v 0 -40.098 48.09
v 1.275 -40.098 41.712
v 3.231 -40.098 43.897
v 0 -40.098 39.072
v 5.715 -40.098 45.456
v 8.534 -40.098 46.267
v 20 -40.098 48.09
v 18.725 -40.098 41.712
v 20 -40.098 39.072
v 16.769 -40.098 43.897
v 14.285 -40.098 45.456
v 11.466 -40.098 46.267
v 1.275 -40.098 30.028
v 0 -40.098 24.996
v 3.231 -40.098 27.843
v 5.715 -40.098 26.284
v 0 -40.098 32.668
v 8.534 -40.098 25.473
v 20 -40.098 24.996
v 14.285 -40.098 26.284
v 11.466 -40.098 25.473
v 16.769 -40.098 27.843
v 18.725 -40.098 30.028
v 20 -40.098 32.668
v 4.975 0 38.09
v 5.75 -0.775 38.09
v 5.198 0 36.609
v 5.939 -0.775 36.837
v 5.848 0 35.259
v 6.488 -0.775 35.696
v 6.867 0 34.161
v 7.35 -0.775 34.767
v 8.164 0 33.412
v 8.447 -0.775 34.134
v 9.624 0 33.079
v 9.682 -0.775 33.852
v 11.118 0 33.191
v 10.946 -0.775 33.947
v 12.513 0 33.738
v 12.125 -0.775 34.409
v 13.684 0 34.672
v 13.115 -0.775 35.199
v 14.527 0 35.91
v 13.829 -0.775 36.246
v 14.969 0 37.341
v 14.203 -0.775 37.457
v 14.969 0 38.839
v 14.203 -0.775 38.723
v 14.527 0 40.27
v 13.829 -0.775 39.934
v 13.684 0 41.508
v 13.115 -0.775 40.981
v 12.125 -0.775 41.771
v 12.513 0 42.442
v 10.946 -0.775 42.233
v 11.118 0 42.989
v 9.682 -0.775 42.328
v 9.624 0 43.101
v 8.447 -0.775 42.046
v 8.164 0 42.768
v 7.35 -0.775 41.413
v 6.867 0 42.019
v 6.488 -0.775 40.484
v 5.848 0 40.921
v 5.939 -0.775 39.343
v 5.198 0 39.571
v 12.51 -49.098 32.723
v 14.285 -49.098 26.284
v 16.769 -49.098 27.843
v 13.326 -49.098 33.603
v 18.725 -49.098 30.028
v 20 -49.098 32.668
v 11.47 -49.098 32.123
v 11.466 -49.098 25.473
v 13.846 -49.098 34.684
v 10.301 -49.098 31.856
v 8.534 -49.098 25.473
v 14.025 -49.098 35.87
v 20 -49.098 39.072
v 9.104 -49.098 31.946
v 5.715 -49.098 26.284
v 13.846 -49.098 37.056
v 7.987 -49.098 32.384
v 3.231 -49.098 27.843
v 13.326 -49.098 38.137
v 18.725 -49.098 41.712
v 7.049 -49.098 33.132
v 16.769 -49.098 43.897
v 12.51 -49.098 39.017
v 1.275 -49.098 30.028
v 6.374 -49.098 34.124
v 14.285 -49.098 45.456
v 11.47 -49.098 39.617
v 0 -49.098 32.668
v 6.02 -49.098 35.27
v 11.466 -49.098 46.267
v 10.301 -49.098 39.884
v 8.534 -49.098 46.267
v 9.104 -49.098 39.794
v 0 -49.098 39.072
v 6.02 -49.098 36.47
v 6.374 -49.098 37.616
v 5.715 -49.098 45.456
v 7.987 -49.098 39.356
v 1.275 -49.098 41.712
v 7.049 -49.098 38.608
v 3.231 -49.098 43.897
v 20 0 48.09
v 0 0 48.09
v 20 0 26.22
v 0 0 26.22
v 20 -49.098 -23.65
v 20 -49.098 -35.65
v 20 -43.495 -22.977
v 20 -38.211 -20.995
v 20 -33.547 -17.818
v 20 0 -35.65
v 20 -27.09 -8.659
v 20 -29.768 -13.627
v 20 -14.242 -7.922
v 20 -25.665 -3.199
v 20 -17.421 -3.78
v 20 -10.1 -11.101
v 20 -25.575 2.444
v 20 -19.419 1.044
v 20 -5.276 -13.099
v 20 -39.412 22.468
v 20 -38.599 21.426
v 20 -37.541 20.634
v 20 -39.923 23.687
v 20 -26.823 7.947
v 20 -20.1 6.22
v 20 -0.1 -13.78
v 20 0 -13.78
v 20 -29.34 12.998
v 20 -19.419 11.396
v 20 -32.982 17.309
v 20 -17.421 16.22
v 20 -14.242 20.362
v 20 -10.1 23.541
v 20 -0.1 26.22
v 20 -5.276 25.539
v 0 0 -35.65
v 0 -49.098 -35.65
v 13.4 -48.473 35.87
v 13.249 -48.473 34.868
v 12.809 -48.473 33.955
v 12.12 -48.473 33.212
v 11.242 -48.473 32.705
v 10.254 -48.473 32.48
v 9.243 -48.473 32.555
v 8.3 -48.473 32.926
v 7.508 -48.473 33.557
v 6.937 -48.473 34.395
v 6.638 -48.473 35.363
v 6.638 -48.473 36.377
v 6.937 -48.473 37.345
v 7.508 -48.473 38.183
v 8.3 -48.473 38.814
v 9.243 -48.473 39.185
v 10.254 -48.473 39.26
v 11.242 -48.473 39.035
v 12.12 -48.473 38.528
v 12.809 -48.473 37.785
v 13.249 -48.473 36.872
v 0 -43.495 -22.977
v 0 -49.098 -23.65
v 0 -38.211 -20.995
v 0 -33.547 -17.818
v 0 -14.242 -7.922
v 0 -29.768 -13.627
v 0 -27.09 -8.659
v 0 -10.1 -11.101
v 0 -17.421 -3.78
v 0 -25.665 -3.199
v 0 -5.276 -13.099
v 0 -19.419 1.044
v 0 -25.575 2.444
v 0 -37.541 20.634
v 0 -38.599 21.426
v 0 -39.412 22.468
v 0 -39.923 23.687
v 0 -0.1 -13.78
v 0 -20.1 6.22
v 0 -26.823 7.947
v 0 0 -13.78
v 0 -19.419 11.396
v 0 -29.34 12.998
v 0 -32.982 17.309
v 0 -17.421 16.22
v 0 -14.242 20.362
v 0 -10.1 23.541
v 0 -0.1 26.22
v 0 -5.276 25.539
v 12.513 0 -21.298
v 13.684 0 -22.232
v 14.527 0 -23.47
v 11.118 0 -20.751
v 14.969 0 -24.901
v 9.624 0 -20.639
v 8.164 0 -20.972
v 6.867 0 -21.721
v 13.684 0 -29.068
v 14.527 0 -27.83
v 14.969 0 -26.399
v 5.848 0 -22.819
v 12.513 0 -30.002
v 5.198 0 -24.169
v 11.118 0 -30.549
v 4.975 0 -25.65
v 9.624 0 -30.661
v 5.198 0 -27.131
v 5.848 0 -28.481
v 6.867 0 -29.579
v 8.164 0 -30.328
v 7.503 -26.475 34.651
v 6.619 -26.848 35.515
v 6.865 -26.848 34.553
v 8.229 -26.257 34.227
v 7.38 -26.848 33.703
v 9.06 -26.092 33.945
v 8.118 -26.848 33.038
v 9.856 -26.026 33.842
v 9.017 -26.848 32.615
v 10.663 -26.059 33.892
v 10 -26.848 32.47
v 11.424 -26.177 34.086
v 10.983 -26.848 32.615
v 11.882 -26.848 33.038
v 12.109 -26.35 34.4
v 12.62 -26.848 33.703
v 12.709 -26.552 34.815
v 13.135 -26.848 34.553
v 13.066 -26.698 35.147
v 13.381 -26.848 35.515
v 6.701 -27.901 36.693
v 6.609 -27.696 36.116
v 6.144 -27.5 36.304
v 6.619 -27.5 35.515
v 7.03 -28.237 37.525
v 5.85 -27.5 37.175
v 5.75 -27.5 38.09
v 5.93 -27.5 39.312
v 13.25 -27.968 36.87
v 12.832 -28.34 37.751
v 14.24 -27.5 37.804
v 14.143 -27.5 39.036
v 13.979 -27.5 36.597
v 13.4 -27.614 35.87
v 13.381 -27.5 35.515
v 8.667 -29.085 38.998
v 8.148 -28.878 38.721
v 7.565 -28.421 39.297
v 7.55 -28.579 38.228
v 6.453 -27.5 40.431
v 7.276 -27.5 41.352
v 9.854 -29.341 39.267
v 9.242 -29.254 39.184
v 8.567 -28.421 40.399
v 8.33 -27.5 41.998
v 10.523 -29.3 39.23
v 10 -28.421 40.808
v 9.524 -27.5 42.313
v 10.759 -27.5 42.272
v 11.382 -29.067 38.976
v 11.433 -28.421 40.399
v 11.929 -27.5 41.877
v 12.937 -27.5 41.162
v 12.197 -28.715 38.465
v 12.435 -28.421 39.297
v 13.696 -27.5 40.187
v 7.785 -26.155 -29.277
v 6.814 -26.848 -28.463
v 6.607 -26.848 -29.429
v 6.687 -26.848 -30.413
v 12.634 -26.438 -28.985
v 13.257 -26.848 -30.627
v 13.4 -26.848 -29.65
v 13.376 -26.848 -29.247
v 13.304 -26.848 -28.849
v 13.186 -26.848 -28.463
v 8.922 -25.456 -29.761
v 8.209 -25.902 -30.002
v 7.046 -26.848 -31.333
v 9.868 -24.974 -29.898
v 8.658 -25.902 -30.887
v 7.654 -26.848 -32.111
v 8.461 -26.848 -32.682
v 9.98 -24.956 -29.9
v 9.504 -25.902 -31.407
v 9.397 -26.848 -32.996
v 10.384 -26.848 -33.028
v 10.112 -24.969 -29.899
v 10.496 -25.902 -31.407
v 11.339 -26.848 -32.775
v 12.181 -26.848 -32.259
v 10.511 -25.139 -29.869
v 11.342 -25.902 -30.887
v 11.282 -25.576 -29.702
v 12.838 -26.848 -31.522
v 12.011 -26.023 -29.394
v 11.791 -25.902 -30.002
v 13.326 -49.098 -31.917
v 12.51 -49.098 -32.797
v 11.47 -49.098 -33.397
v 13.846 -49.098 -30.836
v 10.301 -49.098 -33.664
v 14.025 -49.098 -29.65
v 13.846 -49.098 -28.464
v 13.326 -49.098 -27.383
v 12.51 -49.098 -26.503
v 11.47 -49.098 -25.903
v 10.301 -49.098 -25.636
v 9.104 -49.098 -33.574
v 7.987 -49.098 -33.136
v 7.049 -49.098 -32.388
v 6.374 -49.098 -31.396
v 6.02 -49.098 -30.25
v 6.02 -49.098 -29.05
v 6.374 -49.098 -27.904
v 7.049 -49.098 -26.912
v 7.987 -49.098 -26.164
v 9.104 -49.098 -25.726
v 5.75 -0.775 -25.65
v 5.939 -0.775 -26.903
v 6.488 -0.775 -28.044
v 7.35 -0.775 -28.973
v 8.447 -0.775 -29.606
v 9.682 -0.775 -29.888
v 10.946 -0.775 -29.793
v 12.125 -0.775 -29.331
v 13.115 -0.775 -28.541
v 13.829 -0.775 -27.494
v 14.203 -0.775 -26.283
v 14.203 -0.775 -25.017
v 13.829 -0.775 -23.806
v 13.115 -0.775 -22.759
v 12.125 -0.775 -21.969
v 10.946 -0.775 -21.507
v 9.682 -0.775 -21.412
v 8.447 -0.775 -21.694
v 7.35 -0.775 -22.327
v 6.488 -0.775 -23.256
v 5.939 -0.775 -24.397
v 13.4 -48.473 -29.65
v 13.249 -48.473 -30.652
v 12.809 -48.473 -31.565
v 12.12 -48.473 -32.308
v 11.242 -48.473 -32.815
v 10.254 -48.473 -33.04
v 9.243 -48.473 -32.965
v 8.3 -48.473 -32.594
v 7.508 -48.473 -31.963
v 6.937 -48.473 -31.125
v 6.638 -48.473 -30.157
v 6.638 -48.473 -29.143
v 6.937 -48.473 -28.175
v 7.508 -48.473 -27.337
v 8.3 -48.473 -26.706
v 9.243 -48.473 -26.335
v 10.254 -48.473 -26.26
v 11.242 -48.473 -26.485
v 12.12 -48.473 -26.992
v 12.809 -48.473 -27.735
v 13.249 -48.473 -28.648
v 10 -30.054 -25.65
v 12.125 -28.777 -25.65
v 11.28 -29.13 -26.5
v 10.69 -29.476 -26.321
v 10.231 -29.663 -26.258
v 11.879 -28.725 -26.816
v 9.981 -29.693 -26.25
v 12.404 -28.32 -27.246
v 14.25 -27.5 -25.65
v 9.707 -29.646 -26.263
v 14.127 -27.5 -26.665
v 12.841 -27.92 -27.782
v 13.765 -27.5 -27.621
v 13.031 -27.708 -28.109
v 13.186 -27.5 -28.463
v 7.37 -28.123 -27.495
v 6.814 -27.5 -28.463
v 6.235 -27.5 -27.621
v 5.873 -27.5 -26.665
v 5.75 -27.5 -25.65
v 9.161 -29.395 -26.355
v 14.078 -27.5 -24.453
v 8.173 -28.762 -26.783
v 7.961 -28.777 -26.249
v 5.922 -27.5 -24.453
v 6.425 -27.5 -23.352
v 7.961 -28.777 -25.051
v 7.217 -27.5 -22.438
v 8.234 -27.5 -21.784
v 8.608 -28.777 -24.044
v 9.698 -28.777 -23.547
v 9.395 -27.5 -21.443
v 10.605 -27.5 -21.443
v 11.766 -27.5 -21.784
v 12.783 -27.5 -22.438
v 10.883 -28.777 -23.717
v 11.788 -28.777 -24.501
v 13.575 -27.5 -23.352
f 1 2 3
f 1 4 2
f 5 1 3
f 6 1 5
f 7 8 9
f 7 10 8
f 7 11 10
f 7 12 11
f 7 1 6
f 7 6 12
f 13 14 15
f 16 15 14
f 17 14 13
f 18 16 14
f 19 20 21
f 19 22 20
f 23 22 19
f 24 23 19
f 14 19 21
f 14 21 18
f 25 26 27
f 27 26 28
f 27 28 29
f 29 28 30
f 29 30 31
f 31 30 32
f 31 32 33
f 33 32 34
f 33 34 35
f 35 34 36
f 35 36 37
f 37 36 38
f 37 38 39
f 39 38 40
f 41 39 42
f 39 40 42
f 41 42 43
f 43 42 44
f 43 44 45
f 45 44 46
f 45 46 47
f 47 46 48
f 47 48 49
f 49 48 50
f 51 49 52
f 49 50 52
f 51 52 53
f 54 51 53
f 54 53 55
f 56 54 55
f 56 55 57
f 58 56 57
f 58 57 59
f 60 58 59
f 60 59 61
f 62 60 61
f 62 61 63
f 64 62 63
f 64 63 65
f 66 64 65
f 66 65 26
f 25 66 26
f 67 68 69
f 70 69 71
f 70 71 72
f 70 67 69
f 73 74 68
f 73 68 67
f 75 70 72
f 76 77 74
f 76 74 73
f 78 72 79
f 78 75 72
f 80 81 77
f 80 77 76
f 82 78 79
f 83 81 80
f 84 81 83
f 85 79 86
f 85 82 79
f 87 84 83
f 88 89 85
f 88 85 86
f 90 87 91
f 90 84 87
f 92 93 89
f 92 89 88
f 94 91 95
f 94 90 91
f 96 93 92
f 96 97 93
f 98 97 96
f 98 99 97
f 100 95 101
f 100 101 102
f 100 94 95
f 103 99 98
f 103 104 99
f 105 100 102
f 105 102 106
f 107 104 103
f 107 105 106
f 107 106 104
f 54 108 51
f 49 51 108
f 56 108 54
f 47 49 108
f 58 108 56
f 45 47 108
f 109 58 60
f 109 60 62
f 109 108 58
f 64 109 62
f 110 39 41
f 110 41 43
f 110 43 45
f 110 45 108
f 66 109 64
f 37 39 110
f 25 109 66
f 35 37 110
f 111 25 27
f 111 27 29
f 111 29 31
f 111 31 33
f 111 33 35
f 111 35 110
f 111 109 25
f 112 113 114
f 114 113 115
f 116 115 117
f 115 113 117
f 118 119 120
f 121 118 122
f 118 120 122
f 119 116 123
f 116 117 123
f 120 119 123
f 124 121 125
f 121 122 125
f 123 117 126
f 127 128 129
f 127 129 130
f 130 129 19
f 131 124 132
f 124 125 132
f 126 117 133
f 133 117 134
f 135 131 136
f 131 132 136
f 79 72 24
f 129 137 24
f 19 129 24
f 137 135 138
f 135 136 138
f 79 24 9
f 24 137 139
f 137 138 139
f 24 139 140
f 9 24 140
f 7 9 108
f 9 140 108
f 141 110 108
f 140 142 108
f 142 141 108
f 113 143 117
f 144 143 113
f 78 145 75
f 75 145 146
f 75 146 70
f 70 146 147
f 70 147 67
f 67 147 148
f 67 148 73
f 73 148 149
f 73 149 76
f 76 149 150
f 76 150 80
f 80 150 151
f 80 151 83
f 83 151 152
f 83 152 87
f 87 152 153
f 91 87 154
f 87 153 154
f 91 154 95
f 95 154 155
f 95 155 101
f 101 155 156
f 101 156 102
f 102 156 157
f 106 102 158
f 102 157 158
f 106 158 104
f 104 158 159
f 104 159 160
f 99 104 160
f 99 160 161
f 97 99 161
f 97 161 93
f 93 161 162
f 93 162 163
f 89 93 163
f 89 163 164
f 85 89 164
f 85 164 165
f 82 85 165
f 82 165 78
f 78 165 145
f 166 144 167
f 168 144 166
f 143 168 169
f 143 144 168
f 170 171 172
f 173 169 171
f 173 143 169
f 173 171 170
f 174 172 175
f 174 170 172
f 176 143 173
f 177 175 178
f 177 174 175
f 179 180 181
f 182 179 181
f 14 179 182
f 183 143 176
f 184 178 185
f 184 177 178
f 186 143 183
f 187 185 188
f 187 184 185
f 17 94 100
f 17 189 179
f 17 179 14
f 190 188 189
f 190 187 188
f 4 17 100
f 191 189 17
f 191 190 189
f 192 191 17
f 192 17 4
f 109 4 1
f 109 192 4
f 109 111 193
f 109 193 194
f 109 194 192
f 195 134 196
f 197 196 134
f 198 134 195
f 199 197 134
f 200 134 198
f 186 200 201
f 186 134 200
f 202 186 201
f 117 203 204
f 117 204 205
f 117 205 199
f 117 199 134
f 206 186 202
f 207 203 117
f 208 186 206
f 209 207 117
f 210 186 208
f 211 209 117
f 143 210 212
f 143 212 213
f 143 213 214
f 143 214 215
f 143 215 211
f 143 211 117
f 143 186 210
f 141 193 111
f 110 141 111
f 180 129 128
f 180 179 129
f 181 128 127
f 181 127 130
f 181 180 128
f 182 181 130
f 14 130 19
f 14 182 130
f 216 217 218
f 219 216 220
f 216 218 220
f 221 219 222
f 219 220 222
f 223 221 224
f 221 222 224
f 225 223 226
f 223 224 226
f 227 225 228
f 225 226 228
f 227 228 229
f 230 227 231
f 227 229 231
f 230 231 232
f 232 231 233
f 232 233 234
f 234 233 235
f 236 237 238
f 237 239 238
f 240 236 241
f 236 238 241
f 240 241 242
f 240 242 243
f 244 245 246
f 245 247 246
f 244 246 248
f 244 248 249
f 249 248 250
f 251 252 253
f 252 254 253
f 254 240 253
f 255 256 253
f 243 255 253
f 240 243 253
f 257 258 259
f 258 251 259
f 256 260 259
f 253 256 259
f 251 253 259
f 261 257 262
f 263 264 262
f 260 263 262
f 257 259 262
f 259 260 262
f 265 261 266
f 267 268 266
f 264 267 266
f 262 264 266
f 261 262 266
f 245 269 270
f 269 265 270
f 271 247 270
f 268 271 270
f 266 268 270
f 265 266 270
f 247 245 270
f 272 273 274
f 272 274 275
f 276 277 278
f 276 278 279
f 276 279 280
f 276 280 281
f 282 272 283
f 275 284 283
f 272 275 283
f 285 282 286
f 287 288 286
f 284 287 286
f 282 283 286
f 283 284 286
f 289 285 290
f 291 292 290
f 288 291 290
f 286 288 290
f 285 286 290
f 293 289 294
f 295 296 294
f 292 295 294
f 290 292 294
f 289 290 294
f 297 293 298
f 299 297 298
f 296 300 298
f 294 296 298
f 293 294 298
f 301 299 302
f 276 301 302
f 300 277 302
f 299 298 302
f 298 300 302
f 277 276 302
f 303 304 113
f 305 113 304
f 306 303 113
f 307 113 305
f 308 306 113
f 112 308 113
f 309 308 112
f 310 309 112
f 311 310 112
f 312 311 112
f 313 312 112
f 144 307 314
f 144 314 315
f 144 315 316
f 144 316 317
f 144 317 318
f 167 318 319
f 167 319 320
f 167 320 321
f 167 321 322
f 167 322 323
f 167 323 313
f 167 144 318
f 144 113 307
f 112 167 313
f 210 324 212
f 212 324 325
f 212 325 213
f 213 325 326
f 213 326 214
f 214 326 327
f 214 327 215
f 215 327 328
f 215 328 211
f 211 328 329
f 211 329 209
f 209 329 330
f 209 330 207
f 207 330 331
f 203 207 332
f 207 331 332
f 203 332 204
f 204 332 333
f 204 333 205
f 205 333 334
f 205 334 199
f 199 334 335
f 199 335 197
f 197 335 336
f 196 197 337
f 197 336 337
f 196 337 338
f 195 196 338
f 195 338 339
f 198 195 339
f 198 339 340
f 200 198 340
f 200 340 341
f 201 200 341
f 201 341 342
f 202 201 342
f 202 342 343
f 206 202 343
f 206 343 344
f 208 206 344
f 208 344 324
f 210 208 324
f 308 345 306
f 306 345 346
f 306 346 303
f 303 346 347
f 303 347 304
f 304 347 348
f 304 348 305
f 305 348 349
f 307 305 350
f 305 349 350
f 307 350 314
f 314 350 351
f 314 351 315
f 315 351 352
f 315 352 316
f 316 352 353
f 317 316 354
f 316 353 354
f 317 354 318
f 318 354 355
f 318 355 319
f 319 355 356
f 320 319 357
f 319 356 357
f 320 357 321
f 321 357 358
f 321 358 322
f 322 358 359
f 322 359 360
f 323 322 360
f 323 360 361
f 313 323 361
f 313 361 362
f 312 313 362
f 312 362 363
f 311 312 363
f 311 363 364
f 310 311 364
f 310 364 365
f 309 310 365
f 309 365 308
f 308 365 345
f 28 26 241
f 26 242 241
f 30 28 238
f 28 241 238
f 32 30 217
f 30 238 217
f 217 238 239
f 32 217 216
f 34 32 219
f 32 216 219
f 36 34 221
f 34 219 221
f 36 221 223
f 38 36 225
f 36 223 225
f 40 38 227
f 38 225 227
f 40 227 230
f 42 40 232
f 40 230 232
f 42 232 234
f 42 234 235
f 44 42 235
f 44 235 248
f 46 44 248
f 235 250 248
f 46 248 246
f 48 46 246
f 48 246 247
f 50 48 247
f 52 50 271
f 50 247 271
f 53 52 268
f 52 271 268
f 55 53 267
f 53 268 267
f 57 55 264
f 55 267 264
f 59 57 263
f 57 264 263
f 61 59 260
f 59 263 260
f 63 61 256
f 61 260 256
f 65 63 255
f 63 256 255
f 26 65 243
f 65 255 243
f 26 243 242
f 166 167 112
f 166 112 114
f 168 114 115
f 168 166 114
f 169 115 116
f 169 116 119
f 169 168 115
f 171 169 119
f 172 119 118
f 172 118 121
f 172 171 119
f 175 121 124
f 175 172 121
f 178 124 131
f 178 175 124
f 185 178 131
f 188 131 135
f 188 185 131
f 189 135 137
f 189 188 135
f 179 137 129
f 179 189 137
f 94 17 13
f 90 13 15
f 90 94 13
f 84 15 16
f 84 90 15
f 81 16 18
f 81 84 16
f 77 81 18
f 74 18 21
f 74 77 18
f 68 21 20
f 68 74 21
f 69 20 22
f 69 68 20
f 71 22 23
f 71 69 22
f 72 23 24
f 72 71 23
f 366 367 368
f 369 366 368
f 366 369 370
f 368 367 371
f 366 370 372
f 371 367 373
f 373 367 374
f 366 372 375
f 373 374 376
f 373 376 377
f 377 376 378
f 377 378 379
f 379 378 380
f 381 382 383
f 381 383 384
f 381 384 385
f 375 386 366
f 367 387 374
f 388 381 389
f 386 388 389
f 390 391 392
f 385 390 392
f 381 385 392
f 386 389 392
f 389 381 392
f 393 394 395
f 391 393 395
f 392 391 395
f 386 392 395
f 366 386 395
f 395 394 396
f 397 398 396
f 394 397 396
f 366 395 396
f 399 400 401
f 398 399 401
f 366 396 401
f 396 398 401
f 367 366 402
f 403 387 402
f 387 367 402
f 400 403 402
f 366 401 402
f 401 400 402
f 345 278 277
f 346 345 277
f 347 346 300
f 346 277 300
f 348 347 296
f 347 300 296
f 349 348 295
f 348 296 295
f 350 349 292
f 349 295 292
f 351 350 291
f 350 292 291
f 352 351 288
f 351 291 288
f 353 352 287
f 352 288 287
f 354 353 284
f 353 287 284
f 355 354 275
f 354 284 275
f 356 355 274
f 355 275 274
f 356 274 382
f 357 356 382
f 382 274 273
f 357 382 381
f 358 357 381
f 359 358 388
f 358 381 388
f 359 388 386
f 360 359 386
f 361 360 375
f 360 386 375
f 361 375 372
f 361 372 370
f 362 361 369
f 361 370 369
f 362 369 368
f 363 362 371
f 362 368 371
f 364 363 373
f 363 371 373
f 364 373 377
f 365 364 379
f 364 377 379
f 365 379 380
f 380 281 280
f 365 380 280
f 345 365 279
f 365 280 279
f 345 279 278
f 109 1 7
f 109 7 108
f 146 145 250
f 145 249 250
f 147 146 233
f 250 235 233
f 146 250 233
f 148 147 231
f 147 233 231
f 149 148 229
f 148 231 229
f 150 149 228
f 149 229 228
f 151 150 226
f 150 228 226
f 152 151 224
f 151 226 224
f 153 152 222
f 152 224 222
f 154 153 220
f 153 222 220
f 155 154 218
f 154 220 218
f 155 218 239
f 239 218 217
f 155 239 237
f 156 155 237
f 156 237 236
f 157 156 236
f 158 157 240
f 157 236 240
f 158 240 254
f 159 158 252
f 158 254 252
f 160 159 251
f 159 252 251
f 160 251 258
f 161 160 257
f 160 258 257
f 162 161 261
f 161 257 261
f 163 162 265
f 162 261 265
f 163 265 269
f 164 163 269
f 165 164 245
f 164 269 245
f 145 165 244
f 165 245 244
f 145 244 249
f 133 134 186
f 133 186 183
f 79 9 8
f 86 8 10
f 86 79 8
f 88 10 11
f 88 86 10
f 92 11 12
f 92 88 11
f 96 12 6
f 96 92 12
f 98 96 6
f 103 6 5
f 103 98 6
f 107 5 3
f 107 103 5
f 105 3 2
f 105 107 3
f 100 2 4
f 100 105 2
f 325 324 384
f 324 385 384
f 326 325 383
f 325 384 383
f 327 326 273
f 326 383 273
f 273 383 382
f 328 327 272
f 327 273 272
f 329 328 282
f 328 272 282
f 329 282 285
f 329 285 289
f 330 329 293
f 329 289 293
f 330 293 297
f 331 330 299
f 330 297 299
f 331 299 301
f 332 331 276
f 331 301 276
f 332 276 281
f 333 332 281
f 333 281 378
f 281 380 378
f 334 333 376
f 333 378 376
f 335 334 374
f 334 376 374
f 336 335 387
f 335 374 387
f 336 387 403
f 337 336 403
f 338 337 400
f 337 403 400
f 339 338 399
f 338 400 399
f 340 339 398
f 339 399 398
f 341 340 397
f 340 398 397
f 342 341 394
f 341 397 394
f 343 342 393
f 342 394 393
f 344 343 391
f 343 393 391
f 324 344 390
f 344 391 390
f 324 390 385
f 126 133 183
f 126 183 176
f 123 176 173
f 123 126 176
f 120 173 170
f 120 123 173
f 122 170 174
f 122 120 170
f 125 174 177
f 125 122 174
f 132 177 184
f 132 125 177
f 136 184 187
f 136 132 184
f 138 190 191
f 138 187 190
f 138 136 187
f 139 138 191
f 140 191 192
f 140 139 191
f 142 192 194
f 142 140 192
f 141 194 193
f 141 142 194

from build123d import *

# Parameters (mm, degrees)
BOSS_EXTRUDE1_DEPTH          = 20
M10_TAPPED_HOLE1_D           = 8.5
M10_TAPPED_HOLE1_DEPTH       = 27.5
M10_TAPPED_HOLE1_CSINK_D     = 10.05
M10_TAPPED_HOLE1_CSINK_ANGLE = 90
M10_TAPPED_HOLE1_TIP         = 2.553657631
M8_TAPPED_HOLE1_D            = 6.8
M8_TAPPED_HOLE1_DEPTH        = 22.25
M8_TAPPED_HOLE1_CSINK_D      = 8.05
M8_TAPPED_HOLE1_CSINK_ANGLE  = 90
M8_TAPPED_HOLE1_TIP          = 2.042926105
CUT_EXTRUDE1_DEPTH           = 72.576963501
SKETCH7_R                    = 21.448918638
SKETCH7_R_2                  = 10.5
CUT_EXTRUDE2_DEPTH           = 9
FILLET1_R                    = 5


with BuildPart() as part:
    # Sketch1 → Boss-Extrude1 (new body)
    with BuildSketch(Plane(origin=(0, 0, 0), x_dir=(0, 0, -1), z_dir=(1, 0, 0))):
        with BuildLine():
            Line((-35.65, 0), (35.65, 0))
            Line((35.65, 0), (35.65, -49.098))
            Line((35.65, -49.098), (23.65, -49.098))
            ThreePointArc((23.65, -49.098), (0, -25.448), (-23.65, -49.098))
            Line((-23.65, -49.098), (-35.65, -49.098))
            Line((-35.65, -49.098), (-48.09, -49.098))
            Line((-48.09, -49.098), (-48.09, 0))
            Line((-48.09, 0), (-35.65, 0))
        make_face()
    extrude(amount=BOSS_EXTRUDE1_DEPTH)

    # M10 Tapped Hole1
    with Locations(Plane(origin=(0, 0, 0), x_dir=(1, 0, 0), z_dir=(0, 1, 0))):
        with Locations((10, -38.09), (10, 25.65)):
            CounterSinkHole(M10_TAPPED_HOLE1_D / 2, M10_TAPPED_HOLE1_CSINK_D / 2, depth=M10_TAPPED_HOLE1_DEPTH, counter_sink_angle=M10_TAPPED_HOLE1_CSINK_ANGLE)
            with Locations((0, 0, -(M10_TAPPED_HOLE1_DEPTH + M10_TAPPED_HOLE1_TIP / 2))):  # 118° drill point
                Cone(0, M10_TAPPED_HOLE1_D / 2, M10_TAPPED_HOLE1_TIP, mode=Mode.SUBTRACT)

    # M8 Tapped Hole1
    with Locations(Plane(origin=(0, -49.098, 0), x_dir=(-1, 0, 0), z_dir=(0, -1, 0))):
        with Locations((-10, -35.87), (-10, 29.65)):
            CounterSinkHole(M8_TAPPED_HOLE1_D / 2, M8_TAPPED_HOLE1_CSINK_D / 2, depth=M8_TAPPED_HOLE1_DEPTH, counter_sink_angle=M8_TAPPED_HOLE1_CSINK_ANGLE)
            with Locations((0, 0, -(M8_TAPPED_HOLE1_DEPTH + M8_TAPPED_HOLE1_TIP / 2))):  # 118° drill point
                Cone(0, M8_TAPPED_HOLE1_D / 2, M8_TAPPED_HOLE1_TIP, mode=Mode.SUBTRACT)

    # Sketch6 → Cut-Extrude1 (cut, through all)
    with BuildSketch(Plane(origin=(20, 0, 0), x_dir=(0, 0, -1), z_dir=(1, 0, 0))):
        with BuildLine():
            Line((13.78, 0.1), (13.78, -0.1))
            ThreePointArc((13.78, -0.1), (-6.22, -20.1), (-26.22, -0.1))
            Line((-26.22, -0.1), (-26.22, 0.1))
            ThreePointArc((-26.22, 0.1), (-6.22, 20.1), (13.78, 0.1))
        make_face()
    extrude(amount=-CUT_EXTRUDE1_DEPTH, mode=Mode.SUBTRACT)

    # Sketch7 → Cut-Extrude2 (cut)
    with BuildSketch(Plane.XZ.offset(49.098)):
        with Locations((10, 35.87)):
            Circle(SKETCH7_R)
        with Locations((10, 35.87)):
            Circle(SKETCH7_R_2, mode=Mode.SUBTRACT)
    extrude(amount=-CUT_EXTRUDE2_DEPTH, mode=Mode.SUBTRACT)

    # Fillet1
    fillet1_edges = [part.edges().sort_by_distance(p)[0] for p in [
        (10, -40.098, 21.870585269),
    ]]
    fillet(fillet1_edges, radius=FILLET1_R)


solid = part.part
